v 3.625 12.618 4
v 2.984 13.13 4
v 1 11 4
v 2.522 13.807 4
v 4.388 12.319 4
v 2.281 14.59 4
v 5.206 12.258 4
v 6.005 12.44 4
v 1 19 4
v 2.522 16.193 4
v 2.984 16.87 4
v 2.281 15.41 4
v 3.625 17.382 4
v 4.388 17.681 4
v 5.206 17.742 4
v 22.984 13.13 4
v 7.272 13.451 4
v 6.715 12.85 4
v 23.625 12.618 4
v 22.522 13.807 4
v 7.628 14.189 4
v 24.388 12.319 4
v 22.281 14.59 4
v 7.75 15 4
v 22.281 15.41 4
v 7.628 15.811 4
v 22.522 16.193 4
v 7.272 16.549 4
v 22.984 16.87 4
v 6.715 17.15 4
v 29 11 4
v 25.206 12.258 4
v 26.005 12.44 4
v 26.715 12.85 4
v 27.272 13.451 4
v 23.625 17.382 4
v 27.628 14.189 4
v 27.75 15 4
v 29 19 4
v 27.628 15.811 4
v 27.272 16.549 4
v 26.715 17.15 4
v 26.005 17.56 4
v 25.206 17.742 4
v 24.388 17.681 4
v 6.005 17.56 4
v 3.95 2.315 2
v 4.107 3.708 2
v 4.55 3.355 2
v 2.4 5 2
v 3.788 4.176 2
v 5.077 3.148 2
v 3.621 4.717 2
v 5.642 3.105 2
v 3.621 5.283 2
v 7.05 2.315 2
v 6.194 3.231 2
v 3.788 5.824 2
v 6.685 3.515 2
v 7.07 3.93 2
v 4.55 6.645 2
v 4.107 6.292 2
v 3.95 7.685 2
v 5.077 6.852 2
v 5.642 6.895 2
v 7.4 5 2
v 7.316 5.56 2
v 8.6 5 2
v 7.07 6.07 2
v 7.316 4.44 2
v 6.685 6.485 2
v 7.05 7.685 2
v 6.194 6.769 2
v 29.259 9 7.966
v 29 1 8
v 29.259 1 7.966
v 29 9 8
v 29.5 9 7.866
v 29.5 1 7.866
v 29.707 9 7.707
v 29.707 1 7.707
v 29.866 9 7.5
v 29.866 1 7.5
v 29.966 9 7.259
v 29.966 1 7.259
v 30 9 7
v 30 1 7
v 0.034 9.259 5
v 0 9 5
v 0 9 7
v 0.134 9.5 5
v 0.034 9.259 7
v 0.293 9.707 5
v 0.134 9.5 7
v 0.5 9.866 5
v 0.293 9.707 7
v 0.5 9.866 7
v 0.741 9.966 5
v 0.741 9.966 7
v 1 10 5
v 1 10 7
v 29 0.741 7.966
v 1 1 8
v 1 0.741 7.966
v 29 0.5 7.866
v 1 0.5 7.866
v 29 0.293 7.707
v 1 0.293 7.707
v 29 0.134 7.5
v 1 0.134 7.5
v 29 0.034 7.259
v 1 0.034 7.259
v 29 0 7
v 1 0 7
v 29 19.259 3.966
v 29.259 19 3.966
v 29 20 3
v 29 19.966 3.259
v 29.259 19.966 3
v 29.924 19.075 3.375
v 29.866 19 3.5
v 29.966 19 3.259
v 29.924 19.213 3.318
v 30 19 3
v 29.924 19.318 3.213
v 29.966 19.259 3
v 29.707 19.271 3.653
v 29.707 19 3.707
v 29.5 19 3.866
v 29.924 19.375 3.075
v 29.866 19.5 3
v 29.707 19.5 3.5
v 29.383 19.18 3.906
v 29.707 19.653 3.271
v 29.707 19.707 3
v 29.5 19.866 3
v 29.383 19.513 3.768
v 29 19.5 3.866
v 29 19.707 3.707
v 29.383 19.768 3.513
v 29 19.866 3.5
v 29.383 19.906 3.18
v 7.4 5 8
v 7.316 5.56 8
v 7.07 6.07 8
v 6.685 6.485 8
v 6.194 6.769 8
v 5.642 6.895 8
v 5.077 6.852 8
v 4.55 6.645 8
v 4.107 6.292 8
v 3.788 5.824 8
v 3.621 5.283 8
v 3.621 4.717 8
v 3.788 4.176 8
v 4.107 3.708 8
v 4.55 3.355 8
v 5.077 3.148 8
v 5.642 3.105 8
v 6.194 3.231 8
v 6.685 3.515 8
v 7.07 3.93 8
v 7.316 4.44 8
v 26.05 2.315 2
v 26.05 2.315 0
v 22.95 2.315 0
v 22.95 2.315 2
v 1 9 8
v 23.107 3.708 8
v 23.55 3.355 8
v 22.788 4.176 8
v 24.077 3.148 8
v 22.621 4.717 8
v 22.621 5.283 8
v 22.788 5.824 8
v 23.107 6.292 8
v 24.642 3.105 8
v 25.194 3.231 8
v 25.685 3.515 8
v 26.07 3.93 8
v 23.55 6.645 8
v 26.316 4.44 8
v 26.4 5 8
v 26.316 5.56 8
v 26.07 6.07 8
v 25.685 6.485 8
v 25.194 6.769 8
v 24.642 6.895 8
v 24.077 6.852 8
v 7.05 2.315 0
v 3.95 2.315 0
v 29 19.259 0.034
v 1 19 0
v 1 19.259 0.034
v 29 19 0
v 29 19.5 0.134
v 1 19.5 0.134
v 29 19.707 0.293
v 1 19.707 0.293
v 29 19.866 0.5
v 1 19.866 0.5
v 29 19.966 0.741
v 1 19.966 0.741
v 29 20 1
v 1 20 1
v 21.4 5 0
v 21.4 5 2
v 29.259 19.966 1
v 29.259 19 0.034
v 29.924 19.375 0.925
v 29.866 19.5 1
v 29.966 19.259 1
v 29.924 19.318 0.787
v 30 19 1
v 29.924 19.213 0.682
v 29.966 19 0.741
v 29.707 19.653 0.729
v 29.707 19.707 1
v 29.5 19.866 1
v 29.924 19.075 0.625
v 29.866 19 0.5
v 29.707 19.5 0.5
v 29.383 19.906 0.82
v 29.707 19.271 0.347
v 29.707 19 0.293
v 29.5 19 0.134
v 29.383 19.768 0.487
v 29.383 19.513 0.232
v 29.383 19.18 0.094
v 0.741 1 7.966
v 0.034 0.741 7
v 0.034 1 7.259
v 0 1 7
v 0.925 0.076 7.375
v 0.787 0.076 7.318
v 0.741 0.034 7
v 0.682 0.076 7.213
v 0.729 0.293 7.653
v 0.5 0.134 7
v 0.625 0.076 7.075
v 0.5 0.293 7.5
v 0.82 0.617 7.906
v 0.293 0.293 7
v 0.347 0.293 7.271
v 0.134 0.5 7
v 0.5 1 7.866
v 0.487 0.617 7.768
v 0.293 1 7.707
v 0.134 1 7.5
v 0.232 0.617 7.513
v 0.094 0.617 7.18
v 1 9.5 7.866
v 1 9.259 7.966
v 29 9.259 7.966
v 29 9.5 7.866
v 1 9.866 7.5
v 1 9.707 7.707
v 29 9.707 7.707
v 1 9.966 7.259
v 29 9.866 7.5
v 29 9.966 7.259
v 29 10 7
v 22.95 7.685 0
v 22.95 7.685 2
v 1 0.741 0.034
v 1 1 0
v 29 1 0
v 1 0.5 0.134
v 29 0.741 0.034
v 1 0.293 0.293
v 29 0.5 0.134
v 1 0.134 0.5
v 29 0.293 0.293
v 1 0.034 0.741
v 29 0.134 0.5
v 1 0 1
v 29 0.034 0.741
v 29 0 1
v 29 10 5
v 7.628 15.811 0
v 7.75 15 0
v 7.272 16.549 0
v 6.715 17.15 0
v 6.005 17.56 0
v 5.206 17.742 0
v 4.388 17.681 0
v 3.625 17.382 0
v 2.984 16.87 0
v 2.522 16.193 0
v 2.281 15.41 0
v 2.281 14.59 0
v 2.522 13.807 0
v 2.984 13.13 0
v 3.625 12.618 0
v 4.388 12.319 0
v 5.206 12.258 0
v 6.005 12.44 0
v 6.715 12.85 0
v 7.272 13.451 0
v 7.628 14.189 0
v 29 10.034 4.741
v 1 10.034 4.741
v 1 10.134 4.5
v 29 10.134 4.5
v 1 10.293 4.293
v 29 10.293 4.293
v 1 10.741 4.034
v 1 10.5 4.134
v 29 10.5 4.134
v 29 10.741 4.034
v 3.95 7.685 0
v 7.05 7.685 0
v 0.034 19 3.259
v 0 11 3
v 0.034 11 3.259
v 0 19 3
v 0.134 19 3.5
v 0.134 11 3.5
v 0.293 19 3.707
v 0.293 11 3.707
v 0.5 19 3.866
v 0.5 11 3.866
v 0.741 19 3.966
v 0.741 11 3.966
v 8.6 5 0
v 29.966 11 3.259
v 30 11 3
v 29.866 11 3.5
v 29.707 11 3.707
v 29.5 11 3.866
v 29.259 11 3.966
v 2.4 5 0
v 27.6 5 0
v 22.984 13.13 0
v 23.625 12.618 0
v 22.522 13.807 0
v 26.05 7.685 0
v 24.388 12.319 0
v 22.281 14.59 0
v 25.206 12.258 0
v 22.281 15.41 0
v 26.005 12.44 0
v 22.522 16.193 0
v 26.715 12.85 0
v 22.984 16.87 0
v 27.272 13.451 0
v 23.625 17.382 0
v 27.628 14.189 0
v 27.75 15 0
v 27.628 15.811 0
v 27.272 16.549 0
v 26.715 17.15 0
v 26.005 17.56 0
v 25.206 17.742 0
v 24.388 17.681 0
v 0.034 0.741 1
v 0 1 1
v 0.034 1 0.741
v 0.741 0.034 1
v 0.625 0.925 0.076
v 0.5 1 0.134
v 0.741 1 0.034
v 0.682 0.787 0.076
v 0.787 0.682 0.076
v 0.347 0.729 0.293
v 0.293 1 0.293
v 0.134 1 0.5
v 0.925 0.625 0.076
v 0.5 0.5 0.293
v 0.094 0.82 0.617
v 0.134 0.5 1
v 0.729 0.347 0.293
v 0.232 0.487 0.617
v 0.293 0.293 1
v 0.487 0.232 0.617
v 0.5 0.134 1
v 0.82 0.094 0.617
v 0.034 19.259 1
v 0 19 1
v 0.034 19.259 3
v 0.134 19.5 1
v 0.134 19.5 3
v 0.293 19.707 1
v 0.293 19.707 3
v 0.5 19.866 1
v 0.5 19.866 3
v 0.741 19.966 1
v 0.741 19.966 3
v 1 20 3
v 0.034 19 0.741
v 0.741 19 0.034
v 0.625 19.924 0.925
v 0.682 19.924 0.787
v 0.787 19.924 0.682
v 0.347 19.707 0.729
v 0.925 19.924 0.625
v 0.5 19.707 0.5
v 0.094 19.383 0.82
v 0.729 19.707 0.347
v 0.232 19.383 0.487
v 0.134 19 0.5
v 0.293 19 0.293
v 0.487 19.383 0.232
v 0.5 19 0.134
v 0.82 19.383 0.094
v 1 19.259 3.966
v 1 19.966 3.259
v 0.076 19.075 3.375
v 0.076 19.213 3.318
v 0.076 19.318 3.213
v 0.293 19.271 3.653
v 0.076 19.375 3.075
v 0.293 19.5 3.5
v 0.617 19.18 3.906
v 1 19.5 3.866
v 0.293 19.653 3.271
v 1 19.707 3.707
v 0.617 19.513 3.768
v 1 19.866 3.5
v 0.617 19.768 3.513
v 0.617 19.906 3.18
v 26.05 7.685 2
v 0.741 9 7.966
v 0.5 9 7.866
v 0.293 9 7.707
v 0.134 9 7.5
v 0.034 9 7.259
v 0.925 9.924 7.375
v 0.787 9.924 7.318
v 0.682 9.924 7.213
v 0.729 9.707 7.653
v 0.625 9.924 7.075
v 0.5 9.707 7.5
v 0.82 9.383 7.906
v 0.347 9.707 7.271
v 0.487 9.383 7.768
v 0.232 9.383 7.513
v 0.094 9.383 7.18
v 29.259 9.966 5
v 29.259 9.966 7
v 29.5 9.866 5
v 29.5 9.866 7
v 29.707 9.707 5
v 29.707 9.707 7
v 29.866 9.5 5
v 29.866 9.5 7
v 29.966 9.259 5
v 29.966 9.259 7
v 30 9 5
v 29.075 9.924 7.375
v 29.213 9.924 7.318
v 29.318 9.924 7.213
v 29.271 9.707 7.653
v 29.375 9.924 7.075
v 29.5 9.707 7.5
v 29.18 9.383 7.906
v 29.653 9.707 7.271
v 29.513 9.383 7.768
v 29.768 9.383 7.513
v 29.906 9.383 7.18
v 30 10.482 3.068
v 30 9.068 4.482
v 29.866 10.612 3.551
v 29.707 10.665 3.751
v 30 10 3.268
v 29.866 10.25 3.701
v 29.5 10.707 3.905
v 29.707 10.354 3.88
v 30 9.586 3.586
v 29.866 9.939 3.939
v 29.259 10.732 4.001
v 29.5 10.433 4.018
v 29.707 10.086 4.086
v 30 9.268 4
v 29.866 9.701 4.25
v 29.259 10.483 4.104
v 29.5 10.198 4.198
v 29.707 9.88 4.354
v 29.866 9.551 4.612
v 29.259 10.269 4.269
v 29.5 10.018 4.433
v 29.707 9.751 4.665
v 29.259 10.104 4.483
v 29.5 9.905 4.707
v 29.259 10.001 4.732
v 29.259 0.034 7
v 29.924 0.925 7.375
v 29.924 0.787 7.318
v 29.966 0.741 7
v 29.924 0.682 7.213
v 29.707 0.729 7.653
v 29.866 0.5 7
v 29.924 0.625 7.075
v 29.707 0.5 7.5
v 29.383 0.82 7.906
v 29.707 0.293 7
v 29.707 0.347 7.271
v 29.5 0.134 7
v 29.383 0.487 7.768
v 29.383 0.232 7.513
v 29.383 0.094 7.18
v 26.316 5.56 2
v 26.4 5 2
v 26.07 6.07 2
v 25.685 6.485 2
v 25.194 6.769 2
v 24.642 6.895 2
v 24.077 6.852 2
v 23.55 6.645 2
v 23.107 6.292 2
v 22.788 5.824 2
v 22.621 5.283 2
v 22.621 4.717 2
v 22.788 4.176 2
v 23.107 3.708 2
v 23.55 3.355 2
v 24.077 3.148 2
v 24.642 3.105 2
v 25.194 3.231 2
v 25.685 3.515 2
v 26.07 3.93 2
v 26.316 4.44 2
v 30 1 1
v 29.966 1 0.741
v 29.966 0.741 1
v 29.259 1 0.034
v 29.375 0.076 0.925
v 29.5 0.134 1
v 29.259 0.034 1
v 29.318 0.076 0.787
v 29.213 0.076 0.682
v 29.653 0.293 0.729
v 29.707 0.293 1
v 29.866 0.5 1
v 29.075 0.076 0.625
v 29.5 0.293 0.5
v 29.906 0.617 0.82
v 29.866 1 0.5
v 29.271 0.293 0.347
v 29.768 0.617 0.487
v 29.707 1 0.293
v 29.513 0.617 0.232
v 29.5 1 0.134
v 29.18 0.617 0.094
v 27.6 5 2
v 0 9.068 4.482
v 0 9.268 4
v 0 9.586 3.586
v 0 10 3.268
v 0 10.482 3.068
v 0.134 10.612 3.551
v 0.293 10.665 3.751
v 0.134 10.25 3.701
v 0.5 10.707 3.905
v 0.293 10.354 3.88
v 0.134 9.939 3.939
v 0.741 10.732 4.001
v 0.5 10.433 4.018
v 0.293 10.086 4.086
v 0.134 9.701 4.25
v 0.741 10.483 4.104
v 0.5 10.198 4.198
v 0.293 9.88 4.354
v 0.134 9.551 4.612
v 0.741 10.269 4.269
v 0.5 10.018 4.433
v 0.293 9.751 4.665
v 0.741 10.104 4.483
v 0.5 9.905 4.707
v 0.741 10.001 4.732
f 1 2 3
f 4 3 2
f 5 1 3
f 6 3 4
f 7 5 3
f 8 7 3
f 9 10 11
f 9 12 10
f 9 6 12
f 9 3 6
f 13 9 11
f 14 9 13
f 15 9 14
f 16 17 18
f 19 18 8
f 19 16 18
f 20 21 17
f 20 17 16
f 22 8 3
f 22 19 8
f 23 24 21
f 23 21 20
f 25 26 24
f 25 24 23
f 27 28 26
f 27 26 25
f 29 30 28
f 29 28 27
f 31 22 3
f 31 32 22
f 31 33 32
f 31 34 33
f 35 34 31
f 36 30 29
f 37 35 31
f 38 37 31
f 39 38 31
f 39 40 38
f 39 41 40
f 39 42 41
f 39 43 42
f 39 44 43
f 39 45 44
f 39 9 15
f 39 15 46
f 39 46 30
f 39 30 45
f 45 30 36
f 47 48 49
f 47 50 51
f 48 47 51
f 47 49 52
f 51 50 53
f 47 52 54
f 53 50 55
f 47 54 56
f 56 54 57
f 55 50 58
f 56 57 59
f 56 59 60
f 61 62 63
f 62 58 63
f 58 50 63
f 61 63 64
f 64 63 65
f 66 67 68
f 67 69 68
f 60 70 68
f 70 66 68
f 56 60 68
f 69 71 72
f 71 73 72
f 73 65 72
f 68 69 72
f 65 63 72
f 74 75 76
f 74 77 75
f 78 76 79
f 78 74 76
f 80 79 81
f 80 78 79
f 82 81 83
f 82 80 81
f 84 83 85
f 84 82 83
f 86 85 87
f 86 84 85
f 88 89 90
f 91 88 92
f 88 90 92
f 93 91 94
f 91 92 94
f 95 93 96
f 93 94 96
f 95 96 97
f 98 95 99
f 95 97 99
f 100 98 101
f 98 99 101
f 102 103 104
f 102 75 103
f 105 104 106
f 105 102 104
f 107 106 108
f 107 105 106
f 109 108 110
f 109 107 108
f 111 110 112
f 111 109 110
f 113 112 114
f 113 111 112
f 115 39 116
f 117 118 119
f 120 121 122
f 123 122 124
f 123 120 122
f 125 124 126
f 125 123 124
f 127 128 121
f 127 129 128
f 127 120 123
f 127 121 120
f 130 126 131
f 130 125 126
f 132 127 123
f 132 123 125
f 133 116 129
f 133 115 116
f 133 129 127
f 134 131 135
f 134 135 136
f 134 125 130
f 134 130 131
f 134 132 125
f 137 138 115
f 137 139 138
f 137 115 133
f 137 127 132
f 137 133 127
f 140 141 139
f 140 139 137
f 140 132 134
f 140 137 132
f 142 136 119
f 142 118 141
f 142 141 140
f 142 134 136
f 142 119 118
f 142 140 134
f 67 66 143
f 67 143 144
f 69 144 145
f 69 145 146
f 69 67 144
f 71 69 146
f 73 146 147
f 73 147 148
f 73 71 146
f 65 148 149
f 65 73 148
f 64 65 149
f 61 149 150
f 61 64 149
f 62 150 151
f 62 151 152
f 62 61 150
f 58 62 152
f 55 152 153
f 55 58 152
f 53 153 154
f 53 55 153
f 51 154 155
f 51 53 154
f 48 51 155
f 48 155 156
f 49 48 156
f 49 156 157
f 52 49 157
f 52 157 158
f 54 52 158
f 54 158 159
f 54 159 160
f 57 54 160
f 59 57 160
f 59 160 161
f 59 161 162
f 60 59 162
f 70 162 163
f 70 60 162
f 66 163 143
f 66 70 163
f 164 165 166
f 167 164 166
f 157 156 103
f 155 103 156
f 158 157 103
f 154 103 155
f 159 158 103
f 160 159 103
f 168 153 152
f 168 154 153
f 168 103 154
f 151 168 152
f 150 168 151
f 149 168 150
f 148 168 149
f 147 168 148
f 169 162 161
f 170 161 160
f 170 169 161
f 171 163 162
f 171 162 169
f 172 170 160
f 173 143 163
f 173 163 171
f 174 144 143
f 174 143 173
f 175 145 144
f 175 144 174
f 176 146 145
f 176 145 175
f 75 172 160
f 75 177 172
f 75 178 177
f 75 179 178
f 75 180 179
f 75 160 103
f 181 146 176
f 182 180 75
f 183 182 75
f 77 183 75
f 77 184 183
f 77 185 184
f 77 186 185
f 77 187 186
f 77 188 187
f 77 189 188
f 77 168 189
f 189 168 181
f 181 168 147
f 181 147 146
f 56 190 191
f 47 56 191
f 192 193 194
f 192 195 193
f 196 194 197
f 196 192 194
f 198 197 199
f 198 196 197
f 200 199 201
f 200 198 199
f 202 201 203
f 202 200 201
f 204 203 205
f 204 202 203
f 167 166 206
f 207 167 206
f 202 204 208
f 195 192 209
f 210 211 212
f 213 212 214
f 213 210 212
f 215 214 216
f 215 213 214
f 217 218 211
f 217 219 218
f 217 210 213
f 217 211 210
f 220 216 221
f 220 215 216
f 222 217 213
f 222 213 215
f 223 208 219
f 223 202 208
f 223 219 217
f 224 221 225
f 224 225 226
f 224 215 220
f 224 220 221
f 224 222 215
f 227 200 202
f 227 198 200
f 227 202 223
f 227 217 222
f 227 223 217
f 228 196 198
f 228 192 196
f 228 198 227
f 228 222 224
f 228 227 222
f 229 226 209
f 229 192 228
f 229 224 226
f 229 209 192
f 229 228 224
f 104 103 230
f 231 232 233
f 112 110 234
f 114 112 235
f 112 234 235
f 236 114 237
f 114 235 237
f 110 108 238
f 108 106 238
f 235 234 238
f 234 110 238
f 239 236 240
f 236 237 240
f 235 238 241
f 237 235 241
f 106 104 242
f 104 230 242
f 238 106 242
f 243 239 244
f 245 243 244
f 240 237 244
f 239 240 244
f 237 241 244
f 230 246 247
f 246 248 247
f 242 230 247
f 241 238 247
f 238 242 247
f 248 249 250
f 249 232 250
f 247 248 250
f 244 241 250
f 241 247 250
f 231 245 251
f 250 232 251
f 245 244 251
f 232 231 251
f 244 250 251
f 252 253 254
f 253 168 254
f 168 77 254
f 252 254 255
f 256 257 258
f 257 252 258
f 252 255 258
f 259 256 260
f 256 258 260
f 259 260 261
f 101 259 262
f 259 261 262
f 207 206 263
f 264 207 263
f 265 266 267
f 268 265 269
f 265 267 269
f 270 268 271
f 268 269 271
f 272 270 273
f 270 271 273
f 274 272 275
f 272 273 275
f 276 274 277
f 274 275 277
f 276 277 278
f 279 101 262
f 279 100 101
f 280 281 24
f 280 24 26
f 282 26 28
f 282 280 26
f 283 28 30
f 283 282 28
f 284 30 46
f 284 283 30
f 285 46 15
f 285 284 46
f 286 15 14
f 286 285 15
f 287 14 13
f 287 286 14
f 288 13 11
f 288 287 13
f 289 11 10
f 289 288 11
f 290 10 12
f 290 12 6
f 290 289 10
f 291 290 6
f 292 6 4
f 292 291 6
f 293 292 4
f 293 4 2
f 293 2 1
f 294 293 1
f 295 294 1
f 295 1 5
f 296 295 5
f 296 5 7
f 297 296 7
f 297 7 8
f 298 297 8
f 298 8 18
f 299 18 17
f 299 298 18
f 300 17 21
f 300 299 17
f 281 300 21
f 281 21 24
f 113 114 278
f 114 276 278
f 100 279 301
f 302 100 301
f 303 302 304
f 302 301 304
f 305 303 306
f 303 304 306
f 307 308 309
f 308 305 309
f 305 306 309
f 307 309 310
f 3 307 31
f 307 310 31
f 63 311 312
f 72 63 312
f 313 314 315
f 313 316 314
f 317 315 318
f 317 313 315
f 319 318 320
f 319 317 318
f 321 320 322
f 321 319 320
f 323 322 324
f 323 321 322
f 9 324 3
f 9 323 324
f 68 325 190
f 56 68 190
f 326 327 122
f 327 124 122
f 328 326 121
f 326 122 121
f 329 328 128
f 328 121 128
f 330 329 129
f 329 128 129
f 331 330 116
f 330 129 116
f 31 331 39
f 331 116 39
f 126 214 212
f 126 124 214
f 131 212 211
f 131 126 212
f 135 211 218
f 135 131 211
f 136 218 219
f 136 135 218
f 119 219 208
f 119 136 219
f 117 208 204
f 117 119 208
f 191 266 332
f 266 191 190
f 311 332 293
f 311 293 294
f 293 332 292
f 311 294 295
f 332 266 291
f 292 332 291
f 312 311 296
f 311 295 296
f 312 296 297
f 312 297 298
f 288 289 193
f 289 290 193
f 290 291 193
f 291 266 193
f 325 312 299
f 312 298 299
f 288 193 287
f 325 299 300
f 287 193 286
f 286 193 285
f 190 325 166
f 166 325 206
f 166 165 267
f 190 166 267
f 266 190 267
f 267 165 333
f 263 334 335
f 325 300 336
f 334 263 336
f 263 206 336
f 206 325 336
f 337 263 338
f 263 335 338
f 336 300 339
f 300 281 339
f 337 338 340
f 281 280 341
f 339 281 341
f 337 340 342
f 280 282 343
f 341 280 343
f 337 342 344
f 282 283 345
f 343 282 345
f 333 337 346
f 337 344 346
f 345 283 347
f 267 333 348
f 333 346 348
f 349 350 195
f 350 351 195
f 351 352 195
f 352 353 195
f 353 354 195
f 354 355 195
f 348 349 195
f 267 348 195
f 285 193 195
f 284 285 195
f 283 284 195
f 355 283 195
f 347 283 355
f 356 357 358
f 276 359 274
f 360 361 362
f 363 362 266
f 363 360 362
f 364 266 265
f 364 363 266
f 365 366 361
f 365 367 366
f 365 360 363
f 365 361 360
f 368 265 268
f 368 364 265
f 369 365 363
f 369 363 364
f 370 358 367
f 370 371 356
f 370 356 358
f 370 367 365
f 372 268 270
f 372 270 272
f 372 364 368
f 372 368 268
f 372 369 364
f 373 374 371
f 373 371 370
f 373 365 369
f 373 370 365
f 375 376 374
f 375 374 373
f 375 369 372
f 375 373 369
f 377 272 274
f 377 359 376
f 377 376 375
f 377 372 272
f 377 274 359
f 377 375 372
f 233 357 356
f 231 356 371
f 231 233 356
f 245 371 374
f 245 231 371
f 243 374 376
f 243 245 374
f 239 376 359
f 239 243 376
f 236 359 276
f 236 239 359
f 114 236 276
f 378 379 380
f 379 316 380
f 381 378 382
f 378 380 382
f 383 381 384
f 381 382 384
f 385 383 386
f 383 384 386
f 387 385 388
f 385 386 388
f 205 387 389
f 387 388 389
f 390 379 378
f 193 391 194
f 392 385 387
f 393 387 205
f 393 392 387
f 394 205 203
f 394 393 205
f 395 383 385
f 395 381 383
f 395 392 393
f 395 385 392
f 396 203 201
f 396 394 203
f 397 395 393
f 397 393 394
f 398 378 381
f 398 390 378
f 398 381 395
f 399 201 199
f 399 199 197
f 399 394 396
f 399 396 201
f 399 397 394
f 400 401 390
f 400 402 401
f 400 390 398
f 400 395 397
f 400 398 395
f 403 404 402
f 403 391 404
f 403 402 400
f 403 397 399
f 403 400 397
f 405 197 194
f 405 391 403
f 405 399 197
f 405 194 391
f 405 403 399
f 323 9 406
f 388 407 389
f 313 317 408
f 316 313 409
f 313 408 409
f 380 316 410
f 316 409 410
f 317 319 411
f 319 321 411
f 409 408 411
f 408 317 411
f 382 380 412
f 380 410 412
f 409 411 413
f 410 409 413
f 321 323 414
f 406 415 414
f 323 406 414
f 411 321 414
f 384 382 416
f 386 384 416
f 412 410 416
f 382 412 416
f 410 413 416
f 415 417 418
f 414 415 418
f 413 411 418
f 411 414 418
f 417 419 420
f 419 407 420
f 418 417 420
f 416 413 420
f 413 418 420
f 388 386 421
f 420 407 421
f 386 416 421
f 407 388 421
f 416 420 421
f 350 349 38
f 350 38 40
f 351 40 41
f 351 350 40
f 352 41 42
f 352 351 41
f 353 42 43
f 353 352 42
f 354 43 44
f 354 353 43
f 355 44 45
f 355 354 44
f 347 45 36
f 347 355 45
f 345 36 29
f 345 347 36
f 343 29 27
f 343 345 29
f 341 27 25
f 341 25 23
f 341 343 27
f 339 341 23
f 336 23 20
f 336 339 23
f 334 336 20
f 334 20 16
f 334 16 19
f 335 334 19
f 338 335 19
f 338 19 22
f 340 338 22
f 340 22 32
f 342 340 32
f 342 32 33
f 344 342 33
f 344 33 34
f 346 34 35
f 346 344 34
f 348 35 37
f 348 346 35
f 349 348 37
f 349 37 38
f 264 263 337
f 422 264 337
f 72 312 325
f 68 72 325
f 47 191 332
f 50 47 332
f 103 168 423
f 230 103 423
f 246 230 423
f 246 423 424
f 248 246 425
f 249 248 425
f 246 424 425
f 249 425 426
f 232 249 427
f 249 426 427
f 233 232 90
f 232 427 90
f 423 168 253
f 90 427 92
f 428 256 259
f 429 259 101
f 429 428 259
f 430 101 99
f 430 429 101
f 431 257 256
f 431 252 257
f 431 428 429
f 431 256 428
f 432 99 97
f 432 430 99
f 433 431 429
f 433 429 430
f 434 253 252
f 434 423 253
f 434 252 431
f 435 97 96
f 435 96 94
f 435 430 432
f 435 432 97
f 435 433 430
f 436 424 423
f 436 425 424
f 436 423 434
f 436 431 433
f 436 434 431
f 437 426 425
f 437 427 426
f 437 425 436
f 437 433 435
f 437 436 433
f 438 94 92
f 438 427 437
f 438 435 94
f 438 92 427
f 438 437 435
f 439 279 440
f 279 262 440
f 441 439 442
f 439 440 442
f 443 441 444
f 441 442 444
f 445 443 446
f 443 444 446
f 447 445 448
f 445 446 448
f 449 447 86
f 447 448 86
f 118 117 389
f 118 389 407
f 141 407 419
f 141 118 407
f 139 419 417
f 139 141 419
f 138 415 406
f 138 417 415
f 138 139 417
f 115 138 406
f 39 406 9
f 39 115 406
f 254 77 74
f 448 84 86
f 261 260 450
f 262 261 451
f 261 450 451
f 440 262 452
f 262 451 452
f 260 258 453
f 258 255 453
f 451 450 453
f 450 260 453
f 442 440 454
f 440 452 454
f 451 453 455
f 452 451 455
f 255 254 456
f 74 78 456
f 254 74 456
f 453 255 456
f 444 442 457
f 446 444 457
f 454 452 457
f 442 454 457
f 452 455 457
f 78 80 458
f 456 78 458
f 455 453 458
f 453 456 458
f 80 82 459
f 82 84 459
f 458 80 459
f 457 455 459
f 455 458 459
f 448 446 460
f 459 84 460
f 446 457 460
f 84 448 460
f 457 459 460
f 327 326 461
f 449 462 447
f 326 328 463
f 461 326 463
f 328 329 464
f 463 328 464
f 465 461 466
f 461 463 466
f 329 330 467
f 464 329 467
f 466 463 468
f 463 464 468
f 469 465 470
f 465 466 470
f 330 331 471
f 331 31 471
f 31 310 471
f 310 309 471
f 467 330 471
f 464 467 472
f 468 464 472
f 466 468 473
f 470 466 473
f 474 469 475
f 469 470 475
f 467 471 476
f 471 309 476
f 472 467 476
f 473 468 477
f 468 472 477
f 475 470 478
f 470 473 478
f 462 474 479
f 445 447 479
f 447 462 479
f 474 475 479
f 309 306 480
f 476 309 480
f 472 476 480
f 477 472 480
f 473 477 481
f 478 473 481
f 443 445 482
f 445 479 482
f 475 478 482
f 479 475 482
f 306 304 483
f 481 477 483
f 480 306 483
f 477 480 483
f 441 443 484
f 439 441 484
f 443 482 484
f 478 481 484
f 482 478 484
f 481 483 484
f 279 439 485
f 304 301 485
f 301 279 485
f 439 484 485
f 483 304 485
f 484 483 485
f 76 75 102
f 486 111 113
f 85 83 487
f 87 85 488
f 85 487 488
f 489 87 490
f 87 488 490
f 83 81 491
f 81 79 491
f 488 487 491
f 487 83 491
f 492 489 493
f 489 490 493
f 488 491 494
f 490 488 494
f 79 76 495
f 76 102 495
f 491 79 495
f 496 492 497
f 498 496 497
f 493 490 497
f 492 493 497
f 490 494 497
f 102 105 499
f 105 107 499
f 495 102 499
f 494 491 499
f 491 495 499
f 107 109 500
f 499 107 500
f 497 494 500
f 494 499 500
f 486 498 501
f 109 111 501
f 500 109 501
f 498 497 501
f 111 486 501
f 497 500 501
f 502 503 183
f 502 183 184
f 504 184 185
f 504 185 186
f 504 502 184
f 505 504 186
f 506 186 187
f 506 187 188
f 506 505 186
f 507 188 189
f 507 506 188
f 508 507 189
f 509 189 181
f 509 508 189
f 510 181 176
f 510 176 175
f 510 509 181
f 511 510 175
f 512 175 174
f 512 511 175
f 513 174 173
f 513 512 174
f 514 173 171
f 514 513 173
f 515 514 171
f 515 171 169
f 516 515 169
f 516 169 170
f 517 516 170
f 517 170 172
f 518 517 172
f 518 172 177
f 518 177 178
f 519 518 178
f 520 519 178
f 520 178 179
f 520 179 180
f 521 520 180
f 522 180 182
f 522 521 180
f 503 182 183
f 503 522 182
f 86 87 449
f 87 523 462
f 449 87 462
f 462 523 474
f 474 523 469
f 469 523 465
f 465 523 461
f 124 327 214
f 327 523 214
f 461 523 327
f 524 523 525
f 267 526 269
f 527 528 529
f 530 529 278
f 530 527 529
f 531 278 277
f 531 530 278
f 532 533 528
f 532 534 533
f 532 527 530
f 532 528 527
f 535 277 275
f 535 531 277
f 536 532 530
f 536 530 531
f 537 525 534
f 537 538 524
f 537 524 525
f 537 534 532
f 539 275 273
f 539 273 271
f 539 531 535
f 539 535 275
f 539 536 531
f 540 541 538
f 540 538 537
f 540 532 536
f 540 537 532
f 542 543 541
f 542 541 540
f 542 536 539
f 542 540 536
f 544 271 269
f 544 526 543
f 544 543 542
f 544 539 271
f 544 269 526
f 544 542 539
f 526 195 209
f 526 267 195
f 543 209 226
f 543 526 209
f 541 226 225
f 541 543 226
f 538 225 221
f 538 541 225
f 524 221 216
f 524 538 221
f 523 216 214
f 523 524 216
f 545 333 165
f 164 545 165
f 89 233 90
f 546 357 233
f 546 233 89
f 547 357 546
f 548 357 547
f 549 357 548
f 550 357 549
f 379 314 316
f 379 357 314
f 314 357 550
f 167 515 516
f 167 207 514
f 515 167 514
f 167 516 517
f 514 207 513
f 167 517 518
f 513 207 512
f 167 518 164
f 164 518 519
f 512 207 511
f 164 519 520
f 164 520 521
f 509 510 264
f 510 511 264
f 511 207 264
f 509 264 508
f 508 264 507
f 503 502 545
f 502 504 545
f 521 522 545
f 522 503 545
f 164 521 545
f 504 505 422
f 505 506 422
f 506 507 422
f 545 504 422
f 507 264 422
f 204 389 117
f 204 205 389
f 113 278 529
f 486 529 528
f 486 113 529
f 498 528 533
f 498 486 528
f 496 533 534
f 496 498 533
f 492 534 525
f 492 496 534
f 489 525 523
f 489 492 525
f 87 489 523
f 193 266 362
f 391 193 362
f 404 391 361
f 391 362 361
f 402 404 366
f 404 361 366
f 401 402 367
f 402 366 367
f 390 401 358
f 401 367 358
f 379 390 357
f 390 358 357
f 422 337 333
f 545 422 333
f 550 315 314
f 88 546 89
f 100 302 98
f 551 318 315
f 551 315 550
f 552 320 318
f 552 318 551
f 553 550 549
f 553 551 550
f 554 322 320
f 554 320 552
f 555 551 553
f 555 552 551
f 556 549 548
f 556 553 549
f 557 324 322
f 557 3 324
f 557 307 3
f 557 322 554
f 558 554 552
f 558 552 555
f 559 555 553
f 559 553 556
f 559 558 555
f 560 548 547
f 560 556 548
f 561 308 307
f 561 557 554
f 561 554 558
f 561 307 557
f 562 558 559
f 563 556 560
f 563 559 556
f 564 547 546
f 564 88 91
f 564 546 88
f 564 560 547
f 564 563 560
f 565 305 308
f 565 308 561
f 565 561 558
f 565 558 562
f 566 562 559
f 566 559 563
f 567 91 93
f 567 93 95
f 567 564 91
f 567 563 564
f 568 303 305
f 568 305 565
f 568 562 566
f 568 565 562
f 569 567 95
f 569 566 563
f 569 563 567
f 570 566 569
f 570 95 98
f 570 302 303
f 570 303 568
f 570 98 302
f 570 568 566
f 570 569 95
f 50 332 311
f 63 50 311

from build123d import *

# Parameters (mm, degrees)
F0_W     = 30
F0_H     = 10
F0_R     = 2.75
F1_DEPTH = 4
F2_DEPTH = 8
F3_START = 2
F0_R_2   = 1.9
F3_DEPTH = 6
F4_R     = 1


with BuildPart() as f1:
    # F0 (on Top) → F1 (new body)
    with BuildSketch(Plane.XY):
        with Locations((15, 15)):
            Rectangle(F0_W, F0_H)
        with Locations((5, 15)):
            Circle(F0_R, mode=Mode.SUBTRACT)
        with Locations((25, 15)):
            Circle(F0_R, mode=Mode.SUBTRACT)
    extrude(amount=F1_DEPTH)

    # F0 (on Top) → F2 (join)
    with BuildSketch(Plane.XY):
        with Locations((15, 5)):
            Rectangle(F0_W, F0_H)
        Polygon((3.95, 2.3153212483), (2.4, 5), (3.95, 7.6846787517), (7.05, 7.6846787517), (8.6, 5), (7.05, 2.3153212483), align=None, mode=Mode.SUBTRACT)
        Polygon((22.95, 2.3153212483), (21.4, 5), (22.95, 7.6846787517), (26.05, 7.6846787517), (27.6, 5), (26.05, 2.3153212483), align=None, mode=Mode.SUBTRACT)
    extrude(amount=F2_DEPTH)

    # F0 (on Top) → F3 (join)
    with BuildSketch(Plane.XY.offset(F3_START)):
        Polygon((3.95, 7.6846787517), (2.4, 5), (3.95, 2.3153212483), (7.05, 2.3153212483), (8.6, 5), (7.05, 7.6846787517), align=None)
        with Locations((5.5, 5)):
            Circle(F0_R_2, mode=Mode.SUBTRACT)
        Polygon((22.95, 7.6846787517), (21.4, 5), (22.95, 2.3153212483), (26.05, 2.3153212483), (27.6, 5), (26.05, 7.6846787517), align=None)
        with Locations((24.5, 5)):
            Circle(F0_R_2, mode=Mode.SUBTRACT)
    extrude(amount=F3_DEPTH)

    # F4
    f4_edges = [f1.edges().sort_by_distance(p)[0] for p in [
        (0, 5, 8),
        (15, 0, 8),
        (30, 5, 8),
        (15, 10, 8),
        (15, 10, 4),
        (15, 20, 4),
        (0, 15, 4),
        (30, 15, 4),
        (0, 10, 6),
        (30, 10, 6),
        (0, 0, 4),
        (0, 10, 0),
        (0, 20, 2),
        (15, 20, 0),
        (30, 20, 2),
        (30, 10, 0),
        (30, 0, 4),
        (15, 0, 0),
    ]]
    fillet(f4_edges, radius=F4_R)


solid = f1.part
